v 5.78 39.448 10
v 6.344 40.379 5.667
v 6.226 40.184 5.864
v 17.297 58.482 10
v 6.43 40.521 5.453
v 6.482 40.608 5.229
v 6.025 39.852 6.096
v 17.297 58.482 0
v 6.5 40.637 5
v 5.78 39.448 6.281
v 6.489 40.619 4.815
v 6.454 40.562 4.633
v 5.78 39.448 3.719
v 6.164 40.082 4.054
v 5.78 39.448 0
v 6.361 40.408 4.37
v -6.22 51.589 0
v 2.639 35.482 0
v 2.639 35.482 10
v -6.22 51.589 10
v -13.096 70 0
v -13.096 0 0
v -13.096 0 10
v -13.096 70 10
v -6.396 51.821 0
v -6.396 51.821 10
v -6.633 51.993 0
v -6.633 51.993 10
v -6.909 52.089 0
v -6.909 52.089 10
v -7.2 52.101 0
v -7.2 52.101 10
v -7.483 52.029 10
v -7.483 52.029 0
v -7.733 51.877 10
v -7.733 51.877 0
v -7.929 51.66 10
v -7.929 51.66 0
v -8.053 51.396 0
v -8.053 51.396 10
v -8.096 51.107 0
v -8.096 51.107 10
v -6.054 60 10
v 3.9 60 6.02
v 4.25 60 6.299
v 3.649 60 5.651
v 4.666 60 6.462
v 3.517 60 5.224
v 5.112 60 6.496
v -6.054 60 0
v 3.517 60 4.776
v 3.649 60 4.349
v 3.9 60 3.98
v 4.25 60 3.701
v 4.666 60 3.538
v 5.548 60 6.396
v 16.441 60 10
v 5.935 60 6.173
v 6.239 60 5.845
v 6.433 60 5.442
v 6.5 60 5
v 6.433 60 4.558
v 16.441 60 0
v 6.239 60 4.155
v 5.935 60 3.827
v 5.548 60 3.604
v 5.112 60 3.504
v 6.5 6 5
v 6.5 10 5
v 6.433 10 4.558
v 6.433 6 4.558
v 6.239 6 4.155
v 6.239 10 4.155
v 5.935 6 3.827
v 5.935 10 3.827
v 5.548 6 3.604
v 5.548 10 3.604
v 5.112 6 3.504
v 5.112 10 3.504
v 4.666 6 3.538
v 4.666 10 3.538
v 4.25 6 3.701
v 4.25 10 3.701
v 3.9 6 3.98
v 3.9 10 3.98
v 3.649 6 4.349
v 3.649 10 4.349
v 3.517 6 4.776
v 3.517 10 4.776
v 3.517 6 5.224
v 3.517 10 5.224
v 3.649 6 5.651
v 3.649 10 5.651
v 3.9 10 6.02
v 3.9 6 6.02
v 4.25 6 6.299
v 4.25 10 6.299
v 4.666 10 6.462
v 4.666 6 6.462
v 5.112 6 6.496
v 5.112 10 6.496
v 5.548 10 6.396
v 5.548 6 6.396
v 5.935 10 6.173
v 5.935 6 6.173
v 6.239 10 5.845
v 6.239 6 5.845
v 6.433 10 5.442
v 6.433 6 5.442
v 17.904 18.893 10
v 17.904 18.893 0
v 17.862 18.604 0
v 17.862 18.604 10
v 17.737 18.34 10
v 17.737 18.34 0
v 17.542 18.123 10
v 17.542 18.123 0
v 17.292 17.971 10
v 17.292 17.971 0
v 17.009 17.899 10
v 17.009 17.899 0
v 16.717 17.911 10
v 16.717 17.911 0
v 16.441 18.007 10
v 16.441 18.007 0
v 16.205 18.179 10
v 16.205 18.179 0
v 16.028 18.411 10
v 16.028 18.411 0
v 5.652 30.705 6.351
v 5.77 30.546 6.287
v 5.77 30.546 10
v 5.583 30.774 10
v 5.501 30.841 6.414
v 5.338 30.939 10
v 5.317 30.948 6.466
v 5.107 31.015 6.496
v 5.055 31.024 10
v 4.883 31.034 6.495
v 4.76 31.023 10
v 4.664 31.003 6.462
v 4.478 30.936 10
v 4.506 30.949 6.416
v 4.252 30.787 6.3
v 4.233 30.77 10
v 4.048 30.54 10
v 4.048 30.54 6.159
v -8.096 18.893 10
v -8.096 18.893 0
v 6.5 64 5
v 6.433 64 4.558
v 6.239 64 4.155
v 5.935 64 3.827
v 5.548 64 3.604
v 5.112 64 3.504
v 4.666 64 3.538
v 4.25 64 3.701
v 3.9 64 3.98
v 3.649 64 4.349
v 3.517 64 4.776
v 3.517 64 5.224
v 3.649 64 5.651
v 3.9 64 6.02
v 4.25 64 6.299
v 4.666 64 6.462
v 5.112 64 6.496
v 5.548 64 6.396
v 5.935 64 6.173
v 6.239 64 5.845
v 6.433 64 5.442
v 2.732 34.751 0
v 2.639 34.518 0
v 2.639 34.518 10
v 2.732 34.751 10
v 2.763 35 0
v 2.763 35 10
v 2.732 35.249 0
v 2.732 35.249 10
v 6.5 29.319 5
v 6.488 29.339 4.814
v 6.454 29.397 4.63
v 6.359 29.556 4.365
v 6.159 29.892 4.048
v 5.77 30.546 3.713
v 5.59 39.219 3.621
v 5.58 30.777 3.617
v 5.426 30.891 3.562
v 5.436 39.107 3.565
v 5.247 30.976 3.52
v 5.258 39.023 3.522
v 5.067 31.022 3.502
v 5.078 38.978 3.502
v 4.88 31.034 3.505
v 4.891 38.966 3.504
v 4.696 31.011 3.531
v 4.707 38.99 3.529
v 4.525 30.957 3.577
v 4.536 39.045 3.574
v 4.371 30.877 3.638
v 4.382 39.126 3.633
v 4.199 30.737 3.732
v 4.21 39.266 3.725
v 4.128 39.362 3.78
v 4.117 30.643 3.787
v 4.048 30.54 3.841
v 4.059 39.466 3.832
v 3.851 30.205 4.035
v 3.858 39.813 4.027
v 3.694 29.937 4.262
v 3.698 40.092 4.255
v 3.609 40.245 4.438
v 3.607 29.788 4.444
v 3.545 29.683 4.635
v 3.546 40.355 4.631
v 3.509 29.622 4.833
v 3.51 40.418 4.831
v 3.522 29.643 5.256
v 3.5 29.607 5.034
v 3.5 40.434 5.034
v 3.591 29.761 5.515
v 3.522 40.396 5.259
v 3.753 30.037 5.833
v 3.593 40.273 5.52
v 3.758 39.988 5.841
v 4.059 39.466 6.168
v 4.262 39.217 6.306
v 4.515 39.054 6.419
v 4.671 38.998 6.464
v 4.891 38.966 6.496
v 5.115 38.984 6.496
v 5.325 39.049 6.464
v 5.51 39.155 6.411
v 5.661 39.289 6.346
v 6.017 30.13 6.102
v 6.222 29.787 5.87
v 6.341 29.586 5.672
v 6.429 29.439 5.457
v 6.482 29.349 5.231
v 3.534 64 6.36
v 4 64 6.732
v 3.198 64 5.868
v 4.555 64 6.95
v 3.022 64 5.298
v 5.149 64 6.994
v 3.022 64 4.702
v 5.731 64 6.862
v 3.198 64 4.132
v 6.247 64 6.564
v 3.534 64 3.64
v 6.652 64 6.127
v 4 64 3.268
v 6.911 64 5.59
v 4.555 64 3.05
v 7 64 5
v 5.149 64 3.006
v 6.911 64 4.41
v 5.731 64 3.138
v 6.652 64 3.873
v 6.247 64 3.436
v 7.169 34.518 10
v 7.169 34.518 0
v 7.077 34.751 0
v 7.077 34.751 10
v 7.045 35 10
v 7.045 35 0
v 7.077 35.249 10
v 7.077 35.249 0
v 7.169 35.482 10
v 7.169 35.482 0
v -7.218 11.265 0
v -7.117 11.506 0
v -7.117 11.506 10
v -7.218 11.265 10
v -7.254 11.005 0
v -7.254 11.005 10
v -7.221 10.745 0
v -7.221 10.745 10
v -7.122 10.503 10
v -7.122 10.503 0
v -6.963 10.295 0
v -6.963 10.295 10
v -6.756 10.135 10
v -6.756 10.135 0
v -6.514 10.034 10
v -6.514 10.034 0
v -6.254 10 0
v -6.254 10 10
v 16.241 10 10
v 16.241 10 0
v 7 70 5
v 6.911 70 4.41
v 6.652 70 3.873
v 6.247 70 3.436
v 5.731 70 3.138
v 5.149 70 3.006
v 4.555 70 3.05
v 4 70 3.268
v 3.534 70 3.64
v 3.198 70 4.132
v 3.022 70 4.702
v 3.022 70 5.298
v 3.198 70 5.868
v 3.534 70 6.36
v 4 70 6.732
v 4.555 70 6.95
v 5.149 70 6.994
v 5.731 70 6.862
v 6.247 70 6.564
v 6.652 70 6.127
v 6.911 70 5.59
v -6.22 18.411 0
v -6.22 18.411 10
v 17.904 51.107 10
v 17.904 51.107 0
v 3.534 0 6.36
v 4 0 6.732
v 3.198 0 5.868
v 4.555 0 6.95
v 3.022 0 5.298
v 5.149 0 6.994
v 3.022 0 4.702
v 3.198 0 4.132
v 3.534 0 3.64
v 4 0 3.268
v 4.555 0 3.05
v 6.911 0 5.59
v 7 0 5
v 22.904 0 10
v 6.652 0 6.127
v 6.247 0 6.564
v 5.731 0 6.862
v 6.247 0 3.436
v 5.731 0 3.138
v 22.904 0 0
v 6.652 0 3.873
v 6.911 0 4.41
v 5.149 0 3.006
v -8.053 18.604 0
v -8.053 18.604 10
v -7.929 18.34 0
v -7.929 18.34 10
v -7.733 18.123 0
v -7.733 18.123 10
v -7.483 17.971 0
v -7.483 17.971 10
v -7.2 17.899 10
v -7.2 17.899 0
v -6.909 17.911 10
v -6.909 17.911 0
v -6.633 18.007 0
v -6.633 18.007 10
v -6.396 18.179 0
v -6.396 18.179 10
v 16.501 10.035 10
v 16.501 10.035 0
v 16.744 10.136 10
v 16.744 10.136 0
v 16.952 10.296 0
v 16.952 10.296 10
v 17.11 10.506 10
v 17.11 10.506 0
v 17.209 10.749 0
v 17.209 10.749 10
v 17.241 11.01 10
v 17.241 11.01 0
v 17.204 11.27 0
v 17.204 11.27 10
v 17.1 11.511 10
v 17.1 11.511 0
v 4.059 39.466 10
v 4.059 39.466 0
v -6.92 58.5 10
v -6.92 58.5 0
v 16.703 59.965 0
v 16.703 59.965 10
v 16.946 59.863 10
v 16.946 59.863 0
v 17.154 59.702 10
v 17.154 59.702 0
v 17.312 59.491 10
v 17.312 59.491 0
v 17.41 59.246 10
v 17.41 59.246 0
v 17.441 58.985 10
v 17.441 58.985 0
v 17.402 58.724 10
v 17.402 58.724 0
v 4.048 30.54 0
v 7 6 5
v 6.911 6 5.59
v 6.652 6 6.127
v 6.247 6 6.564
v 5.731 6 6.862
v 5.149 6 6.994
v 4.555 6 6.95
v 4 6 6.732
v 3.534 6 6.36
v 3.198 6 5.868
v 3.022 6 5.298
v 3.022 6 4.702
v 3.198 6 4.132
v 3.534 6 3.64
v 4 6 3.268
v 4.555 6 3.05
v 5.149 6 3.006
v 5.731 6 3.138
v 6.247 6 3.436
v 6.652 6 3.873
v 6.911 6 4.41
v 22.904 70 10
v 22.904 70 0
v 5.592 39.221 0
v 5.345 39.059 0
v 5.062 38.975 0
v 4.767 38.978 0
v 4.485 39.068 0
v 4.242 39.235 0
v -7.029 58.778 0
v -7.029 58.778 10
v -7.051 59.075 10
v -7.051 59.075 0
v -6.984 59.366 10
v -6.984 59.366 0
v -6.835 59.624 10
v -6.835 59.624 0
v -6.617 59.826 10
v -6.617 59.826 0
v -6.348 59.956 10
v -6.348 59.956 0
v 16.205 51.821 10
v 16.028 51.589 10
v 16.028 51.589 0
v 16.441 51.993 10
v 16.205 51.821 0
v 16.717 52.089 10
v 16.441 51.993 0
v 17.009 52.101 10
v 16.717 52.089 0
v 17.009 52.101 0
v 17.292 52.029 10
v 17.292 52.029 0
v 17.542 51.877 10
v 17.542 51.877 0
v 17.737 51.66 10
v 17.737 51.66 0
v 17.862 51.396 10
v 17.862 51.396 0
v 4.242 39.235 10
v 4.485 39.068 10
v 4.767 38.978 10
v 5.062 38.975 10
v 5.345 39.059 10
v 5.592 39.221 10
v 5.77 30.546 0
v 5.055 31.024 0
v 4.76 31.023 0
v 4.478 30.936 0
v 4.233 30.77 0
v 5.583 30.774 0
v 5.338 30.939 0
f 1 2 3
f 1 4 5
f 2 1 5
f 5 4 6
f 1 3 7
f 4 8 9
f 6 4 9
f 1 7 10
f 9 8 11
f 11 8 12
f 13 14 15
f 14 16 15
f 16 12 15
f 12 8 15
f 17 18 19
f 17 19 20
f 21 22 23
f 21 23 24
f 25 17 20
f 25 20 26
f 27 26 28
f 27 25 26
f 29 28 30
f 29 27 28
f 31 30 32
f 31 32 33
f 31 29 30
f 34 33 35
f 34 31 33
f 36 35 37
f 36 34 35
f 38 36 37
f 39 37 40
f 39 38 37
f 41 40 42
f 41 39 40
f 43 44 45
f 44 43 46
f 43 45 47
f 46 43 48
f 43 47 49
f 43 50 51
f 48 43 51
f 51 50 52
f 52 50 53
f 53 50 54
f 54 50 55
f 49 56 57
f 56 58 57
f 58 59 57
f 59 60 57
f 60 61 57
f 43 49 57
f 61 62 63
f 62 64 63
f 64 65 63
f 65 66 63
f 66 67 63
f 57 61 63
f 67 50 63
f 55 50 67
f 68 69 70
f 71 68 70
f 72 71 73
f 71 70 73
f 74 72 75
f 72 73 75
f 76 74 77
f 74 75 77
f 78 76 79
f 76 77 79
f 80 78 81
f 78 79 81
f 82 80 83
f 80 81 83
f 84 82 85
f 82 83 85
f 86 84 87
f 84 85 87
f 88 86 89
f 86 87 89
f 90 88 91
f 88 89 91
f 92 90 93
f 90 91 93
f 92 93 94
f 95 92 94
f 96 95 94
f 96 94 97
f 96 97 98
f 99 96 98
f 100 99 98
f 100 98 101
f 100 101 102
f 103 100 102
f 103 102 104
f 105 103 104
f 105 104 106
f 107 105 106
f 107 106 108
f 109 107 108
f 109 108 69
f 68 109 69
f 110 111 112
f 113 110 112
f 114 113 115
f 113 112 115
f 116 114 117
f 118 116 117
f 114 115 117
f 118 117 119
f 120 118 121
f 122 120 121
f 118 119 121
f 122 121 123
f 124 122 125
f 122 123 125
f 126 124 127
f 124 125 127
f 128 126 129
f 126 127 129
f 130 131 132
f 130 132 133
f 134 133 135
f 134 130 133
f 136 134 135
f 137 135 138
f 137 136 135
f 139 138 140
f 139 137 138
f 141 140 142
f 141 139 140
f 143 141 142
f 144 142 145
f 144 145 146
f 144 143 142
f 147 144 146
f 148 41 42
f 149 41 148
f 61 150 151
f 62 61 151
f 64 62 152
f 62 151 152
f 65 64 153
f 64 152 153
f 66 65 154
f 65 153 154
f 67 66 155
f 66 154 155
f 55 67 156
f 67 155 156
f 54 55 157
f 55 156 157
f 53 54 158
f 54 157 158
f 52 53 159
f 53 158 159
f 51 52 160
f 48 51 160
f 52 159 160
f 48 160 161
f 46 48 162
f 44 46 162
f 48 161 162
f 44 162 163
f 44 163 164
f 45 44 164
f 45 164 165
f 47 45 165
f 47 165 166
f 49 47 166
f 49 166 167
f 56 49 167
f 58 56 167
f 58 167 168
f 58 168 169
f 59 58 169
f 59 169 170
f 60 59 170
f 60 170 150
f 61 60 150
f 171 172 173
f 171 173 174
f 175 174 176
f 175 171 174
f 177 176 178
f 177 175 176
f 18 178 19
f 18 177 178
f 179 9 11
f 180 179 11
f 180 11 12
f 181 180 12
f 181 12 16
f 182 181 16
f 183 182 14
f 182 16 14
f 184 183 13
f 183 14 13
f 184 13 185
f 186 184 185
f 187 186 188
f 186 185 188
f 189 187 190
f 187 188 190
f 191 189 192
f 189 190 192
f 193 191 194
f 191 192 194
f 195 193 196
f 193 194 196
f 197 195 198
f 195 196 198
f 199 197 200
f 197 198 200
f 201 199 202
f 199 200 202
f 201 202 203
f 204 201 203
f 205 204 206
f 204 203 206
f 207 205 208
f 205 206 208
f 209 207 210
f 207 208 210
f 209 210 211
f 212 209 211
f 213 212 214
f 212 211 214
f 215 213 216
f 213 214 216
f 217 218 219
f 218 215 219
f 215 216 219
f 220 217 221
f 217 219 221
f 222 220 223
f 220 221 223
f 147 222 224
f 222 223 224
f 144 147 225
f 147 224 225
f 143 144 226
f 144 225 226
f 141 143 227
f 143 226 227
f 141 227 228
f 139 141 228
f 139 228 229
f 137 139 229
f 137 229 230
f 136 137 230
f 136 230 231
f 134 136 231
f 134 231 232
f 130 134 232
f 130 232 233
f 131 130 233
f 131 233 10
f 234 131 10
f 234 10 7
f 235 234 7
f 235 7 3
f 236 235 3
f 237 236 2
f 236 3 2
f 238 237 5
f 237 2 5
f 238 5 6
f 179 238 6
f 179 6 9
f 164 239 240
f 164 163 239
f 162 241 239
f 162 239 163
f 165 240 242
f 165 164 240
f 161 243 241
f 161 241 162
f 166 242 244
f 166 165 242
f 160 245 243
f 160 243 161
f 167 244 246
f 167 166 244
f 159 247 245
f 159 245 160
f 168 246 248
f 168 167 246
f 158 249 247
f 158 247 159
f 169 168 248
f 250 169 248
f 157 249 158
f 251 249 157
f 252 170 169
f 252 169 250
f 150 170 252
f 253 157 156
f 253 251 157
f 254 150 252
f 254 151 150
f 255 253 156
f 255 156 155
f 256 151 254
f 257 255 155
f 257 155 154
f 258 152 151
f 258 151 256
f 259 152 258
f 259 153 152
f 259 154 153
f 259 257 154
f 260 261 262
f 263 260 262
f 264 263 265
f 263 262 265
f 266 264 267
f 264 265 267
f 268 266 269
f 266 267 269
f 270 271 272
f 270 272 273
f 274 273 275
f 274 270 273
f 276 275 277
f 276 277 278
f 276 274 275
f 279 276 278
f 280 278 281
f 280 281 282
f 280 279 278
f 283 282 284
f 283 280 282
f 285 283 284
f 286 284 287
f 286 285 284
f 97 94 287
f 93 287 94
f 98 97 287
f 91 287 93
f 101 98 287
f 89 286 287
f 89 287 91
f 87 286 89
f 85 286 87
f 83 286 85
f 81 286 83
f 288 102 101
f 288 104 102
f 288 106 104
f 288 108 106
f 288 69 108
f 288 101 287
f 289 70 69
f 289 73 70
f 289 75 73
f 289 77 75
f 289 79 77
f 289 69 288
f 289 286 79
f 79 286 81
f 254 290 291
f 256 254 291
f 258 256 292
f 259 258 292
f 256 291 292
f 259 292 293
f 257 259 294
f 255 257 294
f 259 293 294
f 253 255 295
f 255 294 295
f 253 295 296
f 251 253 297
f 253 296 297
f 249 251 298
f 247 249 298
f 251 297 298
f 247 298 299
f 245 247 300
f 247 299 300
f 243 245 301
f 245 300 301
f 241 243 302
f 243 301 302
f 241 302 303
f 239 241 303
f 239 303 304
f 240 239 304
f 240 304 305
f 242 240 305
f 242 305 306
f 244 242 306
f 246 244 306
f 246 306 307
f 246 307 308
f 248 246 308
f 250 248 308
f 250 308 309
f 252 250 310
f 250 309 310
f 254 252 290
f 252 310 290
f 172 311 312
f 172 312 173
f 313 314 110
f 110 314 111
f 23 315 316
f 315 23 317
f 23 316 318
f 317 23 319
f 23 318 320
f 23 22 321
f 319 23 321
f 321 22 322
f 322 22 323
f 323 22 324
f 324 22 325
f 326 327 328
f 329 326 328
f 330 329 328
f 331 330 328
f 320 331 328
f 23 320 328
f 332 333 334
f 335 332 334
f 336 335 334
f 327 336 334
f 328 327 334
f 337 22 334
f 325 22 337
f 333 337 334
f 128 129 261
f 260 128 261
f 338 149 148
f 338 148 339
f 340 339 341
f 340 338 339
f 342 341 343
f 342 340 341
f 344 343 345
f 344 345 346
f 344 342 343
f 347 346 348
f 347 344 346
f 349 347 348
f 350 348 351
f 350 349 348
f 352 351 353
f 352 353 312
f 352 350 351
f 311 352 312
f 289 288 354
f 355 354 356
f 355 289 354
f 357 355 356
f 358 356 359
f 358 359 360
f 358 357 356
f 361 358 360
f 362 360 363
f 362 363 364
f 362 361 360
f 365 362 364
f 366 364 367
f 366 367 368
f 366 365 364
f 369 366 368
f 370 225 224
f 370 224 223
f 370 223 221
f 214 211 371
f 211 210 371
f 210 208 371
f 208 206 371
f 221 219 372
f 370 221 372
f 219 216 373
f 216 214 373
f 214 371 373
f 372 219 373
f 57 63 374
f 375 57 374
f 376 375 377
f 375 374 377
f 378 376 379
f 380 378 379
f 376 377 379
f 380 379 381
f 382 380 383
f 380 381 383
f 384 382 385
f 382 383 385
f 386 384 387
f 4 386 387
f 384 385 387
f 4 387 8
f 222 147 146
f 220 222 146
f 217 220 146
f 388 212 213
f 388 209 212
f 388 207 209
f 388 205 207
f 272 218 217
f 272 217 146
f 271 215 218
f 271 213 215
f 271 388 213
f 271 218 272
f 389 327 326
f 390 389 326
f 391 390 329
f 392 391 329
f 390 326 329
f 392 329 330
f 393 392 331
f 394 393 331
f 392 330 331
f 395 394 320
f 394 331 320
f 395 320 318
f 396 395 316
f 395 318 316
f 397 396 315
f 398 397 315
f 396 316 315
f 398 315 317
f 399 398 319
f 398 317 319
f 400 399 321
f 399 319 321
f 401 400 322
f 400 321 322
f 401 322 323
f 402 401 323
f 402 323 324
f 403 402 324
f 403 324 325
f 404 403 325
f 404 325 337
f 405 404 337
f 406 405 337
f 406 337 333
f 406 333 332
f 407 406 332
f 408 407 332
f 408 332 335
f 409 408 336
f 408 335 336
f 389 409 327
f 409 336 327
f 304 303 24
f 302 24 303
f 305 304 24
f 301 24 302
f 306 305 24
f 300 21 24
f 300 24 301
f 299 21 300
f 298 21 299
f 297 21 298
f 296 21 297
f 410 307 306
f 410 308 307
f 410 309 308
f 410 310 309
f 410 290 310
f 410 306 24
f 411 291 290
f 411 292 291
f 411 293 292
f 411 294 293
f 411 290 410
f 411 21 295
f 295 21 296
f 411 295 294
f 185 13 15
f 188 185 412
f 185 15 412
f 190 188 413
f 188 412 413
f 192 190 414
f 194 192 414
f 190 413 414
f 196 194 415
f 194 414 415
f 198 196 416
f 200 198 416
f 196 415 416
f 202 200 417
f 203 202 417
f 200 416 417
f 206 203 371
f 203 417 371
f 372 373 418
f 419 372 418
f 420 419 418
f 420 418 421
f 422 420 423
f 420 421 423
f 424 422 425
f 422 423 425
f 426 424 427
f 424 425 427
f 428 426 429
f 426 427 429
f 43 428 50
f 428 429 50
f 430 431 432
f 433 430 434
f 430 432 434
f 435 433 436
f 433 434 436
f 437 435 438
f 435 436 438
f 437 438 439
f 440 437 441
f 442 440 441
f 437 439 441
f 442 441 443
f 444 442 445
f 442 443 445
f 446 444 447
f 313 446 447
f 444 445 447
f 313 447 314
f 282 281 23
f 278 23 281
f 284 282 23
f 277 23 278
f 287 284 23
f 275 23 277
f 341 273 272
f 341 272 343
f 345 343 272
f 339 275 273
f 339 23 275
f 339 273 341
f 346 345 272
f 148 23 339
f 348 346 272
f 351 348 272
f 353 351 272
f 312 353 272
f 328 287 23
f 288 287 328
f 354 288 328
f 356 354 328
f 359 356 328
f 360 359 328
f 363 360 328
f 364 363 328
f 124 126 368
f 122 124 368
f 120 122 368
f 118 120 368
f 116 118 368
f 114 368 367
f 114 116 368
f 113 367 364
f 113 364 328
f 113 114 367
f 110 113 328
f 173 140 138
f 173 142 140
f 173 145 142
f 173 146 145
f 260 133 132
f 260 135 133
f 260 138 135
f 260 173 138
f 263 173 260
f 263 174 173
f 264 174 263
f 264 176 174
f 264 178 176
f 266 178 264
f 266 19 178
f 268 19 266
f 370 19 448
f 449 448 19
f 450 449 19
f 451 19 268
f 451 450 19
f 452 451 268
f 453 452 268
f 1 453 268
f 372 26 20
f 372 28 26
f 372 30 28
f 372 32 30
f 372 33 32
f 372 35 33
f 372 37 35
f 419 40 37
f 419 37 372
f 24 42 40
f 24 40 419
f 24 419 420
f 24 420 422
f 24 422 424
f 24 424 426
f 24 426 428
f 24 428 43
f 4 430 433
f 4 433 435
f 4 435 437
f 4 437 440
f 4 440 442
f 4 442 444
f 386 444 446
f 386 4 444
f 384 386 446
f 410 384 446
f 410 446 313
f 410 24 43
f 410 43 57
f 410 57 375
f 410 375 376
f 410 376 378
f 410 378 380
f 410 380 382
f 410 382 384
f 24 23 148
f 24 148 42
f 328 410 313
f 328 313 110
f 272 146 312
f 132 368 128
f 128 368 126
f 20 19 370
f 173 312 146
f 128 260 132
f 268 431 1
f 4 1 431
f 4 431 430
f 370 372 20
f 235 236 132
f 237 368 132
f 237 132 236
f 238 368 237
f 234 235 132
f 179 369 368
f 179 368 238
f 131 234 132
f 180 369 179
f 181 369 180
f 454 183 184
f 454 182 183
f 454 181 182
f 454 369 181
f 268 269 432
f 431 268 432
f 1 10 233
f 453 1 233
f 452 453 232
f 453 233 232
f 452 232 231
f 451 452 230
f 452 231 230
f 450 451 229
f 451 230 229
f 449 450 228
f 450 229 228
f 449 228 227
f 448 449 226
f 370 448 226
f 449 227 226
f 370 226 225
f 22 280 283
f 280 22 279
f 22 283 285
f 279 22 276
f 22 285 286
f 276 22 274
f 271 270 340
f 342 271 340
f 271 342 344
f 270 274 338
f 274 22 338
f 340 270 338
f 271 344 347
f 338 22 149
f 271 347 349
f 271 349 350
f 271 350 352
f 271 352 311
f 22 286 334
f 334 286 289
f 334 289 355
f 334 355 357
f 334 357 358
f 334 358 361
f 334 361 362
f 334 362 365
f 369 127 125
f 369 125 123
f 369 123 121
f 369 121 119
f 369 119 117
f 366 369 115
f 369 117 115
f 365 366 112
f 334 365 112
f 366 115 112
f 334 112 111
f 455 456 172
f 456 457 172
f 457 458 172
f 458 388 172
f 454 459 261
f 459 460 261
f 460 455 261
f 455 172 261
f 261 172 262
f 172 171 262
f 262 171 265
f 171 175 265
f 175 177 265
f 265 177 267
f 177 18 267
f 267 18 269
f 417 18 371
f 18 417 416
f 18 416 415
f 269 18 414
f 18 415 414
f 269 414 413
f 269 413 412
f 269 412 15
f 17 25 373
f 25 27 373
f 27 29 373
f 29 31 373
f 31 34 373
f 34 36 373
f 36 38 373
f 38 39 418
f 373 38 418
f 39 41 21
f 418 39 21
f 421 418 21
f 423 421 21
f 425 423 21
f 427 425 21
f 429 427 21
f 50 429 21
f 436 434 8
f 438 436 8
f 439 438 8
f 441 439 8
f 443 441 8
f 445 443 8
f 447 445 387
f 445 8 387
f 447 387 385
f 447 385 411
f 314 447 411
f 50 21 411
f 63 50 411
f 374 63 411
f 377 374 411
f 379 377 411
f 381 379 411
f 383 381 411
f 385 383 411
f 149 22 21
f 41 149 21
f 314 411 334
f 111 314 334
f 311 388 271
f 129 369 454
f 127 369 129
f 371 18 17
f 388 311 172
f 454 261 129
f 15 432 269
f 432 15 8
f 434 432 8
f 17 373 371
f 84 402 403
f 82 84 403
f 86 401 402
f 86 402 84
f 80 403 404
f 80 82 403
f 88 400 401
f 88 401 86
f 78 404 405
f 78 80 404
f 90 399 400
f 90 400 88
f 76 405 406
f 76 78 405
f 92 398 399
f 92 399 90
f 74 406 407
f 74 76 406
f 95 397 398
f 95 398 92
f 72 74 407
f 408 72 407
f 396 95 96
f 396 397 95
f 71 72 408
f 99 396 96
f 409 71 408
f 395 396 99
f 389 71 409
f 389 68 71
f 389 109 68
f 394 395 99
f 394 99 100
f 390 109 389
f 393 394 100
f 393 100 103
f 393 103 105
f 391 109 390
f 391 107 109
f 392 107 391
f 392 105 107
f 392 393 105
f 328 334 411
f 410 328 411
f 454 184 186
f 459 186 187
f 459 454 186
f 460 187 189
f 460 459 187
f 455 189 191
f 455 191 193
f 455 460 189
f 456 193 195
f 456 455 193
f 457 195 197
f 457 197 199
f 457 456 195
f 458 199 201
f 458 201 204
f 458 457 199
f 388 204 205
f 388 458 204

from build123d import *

# Parameters (mm, degrees)
SKIZZE1_W                       = 36
SKIZZE1_H                       = 70
AUFSATZ_LINEAR_AUSTRAGEN1_DEPTH = 10
SKIZZE2_R                       = 1.5
SCHNITT_LINEAR_AUSTRAGEN1_DEPTH = 71
SKIZZE3_R                       = 2
SCHNITT_LINEAR_AUSTRAGEN2_DEPTH = 6
SKIZZE4_R                       = 2
SCHNITT_LINEAR_AUSTRAGEN3_DEPTH = 6


with BuildPart() as part:
    # Skizze1 → Aufsatz-Linear austragen1 (new body)
    with BuildSketch(Plane.XY):
        with Locations((4.904225341, 35)):
            Rectangle(SKIZZE1_W, SKIZZE1_H)
        with BuildLine():
            Line((17.904225341, 51.106779598), (17.904225341, 18.893220402))
            ThreePointArc((17.904225341, 18.893220402), (17.153006461, 17.92466067), (16.028009433, 18.411301652))
            Line((16.028009433, 18.411301652), (7.169280654, 34.51808125))
            ThreePointArc((7.169280654, 34.51808125), (7.045496562, 35), (7.169280654, 35.48191875))
            Line((7.169280654, 35.48191875), (16.028009433, 51.588698348))
            ThreePointArc((16.028009433, 51.588698348), (17.153006461, 52.07533933), (17.904225341, 51.106779598))
        make_face(mode=Mode.SUBTRACT)
        with BuildLine():
            Line((-8.095774659, 51.106779598), (-8.095774659, 18.893220402))
            ThreePointArc((-8.095774659, 18.893220402), (-7.344555779, 17.92466067), (-6.21955875, 18.411301652))
            Line((-6.21955875, 18.411301652), (2.639170029, 34.51808125))
            ThreePointArc((2.639170029, 34.51808125), (2.76295412, 35), (2.639170029, 35.48191875))
            Line((2.639170029, 35.48191875), (-6.21955875, 51.588698348))
            ThreePointArc((-6.21955875, 51.588698348), (-7.344555779, 52.07533933), (-8.095774659, 51.106779598))
        make_face(mode=Mode.SUBTRACT)
        with BuildLine():
            Line((-6.053662963, 60), (16.441312792, 60))
            ThreePointArc((16.441312792, 60), (17.312422464, 59.491088524), (17.296896718, 58.482335877))
            Line((17.296896718, 58.482335877), (5.780402017, 39.448125623))
            ThreePointArc((5.780402017, 39.448125623), (4.914343105, 38.96584461), (4.058577468, 39.466162699))
            Line((4.058577468, 39.466162699), (-6.919903585, 58.500372954))
            ThreePointArc((-6.919903585, 58.500372954), (-6.919580698, 59.500186442), (-6.053662963, 60))
        make_face(mode=Mode.SUBTRACT)
        with BuildLine():
            Line((-6.25411364, 10), (16.240977478, 10))
            ThreePointArc((16.240977478, 10), (17.110316116, 10.505783111), (17.100261151, 11.511499334))
            Line((17.100261151, 11.511499334), (5.769851759, 30.545807203))
            ThreePointArc((5.769851759, 30.545807203), (4.907341379, 31.034302663), (4.048001406, 30.540251269))
            Line((4.048001406, 30.540251269), (-7.116680319, 11.5059434))
            ThreePointArc((-7.116680319, 11.5059434), (-7.121853059, 10.502980584), (-6.25411364, 10))
        make_face(mode=Mode.SUBTRACT)
    extrude(amount=AUFSATZ_LINEAR_AUSTRAGEN1_DEPTH)

    # Skizze2 → Schnitt-Linear austragen1 (cut, through all)
    with BuildSketch(Plane(origin=(0, 70, 0), x_dir=(1, 0, 0), z_dir=(0, 1, 0))):
        with Locations((5, -5)):
            Circle(SKIZZE2_R)
    extrude(amount=-SCHNITT_LINEAR_AUSTRAGEN1_DEPTH, mode=Mode.SUBTRACT)

    # Skizze3 → Schnitt-Linear austragen2 (cut)
    with BuildSketch(Plane(origin=(0, 70, 0), x_dir=(1, 0, 0), z_dir=(0, 1, 0))):
        with Locations((5, -5)):
            Circle(SKIZZE3_R)
    extrude(amount=-SCHNITT_LINEAR_AUSTRAGEN2_DEPTH, mode=Mode.SUBTRACT)

    # Skizze4 → Schnitt-Linear austragen3 (cut)
    with BuildSketch(Plane.XZ):
        with Locations((5, 5)):
            Circle(SKIZZE4_R)
    extrude(amount=-SCHNITT_LINEAR_AUSTRAGEN3_DEPTH, mode=Mode.SUBTRACT)


solid = part.part
